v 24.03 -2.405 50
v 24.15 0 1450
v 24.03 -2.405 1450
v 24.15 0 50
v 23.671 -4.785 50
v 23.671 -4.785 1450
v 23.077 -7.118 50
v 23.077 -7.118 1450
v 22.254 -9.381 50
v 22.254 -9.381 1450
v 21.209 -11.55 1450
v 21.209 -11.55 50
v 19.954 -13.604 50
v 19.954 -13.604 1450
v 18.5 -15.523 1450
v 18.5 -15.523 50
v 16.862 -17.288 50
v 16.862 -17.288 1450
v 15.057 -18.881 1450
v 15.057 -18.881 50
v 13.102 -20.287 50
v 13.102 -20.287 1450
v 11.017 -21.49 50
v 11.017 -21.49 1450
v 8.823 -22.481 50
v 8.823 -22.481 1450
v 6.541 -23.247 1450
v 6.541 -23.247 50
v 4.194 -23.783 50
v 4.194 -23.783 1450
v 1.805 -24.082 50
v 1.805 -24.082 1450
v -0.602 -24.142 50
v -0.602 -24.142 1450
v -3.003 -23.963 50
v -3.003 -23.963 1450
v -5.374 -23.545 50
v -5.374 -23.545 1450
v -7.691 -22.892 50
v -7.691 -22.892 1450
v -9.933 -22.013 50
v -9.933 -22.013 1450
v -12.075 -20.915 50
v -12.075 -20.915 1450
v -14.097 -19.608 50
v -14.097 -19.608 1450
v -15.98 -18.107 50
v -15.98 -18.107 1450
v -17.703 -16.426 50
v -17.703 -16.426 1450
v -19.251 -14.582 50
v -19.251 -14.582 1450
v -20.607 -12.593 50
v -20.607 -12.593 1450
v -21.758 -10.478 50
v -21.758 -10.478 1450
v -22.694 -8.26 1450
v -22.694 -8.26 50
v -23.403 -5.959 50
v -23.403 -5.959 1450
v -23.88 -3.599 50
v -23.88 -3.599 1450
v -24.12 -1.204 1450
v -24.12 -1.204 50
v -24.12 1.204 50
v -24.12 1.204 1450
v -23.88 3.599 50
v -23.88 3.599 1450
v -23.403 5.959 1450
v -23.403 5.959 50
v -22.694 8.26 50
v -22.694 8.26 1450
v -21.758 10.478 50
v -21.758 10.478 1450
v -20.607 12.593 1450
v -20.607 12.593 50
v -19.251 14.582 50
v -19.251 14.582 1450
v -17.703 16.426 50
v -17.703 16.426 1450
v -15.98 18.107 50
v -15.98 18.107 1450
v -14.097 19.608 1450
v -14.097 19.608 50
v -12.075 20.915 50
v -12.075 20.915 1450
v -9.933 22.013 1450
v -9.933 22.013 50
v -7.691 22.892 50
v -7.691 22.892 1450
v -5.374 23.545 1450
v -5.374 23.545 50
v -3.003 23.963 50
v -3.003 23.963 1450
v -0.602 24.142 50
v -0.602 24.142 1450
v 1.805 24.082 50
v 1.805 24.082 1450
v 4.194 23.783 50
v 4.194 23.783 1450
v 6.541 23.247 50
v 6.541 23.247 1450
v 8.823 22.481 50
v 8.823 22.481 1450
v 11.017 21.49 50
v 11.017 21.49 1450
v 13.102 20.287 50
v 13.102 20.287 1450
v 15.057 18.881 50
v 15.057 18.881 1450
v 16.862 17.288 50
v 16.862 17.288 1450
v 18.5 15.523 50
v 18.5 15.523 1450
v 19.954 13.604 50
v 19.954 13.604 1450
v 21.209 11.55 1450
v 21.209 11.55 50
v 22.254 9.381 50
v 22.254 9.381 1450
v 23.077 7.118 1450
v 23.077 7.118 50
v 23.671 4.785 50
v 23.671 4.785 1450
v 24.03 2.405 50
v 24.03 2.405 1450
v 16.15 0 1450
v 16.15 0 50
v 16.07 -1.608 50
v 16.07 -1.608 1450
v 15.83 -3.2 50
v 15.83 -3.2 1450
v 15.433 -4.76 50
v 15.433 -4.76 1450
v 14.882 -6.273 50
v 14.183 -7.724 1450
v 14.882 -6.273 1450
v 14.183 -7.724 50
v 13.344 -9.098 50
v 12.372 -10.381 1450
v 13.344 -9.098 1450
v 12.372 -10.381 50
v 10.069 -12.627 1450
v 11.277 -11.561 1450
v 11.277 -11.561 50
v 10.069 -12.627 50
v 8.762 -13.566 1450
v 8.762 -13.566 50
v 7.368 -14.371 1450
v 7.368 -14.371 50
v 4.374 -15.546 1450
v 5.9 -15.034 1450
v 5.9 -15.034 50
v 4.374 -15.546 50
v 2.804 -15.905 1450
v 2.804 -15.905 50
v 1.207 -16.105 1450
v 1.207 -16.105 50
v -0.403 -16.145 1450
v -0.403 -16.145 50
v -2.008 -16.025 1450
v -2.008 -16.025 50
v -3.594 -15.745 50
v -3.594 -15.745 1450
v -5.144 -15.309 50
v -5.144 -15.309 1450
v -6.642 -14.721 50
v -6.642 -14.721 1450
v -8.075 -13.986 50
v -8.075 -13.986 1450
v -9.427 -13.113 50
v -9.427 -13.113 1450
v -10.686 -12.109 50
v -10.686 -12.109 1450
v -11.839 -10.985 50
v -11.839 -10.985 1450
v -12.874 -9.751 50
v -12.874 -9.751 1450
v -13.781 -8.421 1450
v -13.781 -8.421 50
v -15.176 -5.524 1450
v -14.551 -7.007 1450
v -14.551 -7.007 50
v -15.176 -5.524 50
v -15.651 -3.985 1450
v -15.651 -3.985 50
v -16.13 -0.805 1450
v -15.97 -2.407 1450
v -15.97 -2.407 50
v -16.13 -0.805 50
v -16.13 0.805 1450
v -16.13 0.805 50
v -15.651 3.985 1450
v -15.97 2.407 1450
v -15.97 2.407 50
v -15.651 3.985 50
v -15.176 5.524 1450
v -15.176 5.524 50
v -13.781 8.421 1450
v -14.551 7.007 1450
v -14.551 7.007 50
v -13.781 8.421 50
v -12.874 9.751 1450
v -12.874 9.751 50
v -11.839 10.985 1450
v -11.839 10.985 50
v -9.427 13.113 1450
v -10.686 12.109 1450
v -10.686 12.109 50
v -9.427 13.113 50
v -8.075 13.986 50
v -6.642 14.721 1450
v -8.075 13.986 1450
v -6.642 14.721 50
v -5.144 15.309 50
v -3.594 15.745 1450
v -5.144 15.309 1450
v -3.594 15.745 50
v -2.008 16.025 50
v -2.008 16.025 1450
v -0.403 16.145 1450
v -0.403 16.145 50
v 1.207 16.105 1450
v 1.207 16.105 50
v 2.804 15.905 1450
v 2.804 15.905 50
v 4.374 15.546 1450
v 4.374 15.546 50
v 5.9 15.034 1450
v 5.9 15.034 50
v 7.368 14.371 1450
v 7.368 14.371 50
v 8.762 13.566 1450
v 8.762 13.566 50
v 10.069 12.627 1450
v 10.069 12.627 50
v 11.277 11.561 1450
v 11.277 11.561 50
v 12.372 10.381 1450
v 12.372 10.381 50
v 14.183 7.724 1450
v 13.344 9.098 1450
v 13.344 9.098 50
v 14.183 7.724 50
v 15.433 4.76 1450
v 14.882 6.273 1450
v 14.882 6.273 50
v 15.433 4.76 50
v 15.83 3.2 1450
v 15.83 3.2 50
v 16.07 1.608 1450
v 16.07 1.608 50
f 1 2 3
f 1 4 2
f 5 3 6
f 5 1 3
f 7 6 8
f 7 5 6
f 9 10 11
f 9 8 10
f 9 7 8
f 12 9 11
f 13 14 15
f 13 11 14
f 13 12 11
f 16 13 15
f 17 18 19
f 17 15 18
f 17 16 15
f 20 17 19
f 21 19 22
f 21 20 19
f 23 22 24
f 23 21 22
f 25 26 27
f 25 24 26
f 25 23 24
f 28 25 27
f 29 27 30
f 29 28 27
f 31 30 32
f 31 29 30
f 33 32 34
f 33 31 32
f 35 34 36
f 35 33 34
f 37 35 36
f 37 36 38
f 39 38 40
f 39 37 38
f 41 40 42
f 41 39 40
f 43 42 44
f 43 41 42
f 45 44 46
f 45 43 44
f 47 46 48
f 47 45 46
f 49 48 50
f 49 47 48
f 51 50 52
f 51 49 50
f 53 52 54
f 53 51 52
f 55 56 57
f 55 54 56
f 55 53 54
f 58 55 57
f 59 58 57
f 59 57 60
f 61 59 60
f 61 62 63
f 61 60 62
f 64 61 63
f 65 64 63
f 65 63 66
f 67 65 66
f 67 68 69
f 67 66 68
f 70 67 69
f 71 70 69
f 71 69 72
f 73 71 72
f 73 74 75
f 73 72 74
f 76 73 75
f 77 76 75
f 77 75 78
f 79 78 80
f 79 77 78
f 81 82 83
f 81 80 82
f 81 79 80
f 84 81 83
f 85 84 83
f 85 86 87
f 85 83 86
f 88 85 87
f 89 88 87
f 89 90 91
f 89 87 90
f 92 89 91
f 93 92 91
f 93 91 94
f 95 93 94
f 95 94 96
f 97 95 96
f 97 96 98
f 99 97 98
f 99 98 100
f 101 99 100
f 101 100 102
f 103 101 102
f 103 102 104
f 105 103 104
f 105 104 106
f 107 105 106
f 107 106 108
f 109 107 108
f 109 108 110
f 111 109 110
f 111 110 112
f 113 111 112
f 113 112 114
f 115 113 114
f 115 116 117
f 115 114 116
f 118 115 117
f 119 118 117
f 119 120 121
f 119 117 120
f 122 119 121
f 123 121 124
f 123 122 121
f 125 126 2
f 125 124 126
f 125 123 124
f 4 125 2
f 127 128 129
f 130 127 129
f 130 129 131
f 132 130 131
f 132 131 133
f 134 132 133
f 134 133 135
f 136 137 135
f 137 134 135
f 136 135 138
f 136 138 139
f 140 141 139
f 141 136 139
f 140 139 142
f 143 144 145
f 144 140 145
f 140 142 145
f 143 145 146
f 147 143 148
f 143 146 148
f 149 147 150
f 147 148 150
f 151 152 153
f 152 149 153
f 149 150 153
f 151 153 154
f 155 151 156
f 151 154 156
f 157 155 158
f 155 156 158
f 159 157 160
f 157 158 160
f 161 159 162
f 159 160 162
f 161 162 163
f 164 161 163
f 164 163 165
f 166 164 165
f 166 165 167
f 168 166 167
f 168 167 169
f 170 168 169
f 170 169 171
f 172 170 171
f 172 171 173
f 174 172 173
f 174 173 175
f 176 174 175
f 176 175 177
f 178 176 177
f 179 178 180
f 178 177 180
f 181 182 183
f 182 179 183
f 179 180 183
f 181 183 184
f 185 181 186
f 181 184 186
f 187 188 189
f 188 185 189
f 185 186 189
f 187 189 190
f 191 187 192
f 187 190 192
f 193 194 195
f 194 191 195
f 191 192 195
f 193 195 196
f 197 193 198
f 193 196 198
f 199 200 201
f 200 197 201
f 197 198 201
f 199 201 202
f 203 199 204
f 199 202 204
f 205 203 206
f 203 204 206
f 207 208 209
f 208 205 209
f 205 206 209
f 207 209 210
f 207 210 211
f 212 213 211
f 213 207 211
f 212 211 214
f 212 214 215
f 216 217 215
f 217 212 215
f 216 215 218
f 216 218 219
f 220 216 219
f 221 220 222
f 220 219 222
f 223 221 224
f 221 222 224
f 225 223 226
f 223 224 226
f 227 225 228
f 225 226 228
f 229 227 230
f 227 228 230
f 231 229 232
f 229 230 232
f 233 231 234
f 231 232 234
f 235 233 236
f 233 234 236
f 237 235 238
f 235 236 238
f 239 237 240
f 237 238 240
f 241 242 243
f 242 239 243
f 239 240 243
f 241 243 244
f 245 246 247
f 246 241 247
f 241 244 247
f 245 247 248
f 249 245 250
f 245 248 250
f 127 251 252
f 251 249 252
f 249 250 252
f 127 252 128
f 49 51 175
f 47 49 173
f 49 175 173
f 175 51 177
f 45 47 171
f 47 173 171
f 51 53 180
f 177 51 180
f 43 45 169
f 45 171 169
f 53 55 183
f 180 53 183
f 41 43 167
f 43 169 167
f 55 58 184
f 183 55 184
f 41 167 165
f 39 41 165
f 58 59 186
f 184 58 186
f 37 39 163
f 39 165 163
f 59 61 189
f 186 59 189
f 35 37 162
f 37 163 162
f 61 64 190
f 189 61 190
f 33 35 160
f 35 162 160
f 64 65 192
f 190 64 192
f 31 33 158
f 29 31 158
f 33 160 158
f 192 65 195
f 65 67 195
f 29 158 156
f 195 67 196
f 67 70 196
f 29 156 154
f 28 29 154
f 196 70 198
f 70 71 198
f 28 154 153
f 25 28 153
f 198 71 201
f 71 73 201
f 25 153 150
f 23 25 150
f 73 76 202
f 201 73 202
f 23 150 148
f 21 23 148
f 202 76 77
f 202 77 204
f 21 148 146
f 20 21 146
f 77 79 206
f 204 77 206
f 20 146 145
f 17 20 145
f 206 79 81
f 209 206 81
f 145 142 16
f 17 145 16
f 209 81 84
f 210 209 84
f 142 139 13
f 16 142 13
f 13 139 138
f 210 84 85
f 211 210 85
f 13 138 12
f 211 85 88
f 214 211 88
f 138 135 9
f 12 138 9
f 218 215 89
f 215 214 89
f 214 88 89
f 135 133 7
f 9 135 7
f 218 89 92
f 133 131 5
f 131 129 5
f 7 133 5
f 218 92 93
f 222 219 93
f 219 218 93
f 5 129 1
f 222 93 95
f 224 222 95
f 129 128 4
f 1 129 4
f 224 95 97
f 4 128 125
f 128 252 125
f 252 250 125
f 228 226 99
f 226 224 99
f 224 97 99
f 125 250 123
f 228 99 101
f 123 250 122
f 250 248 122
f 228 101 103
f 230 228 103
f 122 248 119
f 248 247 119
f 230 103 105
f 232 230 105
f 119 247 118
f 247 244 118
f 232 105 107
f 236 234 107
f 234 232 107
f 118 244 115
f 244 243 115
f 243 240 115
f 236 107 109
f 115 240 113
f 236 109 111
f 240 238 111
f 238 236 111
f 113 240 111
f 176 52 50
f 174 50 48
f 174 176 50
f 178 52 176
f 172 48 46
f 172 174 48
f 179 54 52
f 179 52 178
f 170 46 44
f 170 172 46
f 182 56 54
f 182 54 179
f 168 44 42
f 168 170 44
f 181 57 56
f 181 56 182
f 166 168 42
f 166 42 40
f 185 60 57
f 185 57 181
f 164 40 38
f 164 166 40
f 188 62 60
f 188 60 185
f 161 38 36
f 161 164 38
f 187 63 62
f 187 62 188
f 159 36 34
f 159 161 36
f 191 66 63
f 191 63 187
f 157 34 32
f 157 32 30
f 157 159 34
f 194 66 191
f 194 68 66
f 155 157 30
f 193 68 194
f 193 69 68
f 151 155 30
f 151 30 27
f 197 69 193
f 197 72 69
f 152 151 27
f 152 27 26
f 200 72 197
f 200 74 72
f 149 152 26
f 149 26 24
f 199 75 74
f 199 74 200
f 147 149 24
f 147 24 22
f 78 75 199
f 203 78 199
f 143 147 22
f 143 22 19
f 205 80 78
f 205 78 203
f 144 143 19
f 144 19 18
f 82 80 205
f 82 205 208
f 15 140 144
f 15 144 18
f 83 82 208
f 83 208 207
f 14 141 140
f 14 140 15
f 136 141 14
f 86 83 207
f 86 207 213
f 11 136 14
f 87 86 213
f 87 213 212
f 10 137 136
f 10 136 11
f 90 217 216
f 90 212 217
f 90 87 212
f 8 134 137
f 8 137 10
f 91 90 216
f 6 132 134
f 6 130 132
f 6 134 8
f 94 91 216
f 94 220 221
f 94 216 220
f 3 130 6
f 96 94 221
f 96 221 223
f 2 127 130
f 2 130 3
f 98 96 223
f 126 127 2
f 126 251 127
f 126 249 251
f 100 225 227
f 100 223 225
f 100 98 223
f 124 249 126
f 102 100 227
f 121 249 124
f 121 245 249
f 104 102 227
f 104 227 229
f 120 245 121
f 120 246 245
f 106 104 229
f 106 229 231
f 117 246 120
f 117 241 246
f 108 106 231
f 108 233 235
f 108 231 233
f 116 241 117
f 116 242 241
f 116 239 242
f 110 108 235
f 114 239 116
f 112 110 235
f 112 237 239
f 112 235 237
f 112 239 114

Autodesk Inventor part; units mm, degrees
ref_plane "Начальная плоскость" through (0, 0, 50) normal (0, 0, 1) x (1, 0, 0)
ref_plane "Конечная плоскость" through (0, 0, 1450) normal (0, 0, 1) x (1, 0, 0)
sketch "Эскиз" plane through (0, 0, 0) normal (0, 0, 1) x (1, 0, 0)
  circle A0 centre (0, 0) radius 16.15
  circle A1 centre (0, 0) radius 24.15
  dimension "d0" = 48.3
  dimension "d1" = 8
extrude "Тело" add sketch "Эскиз" along normal up to surface (1400 mm away) from surface at 50
sketch "Sketch3" plane through (0, 0, 0) normal (0, 0, 1) x (1, 0, 0)
  line L0 (0, 0) -> (10, 0)
ref_plane "Work Plane3" through (0, 0, 0) normal (0, -1, 0) x (1, 0, 0)
sketch "Sketch4" plane through (0, 0, 0) normal (0, -1, 0) x (1, 0, 0)
  line L0 (-2, 50) -> (12, 50)
  line L1 (-2, 1450) -> (12, 1450)
  dimension "d7" = 1400
ref_plane "РабПлоскость4" through (25, -1000, 50) normal (0, 0, -1) x (-1, 0, 0)
split "Разделение1" plane through (25, -1000, 50) removes the side toward (0, 0, -1)
ref_plane "РабПлоскость5" through (-25, -1000, 1450) normal (0, 0, 1) x (1, 0, 0)
split "Разделение2" plane through (-25, -1000, 1450) removes the side toward (0, 0, 1)
equation "\"d0\" = G_H"
equation "\"d1\" = G_T"
equation "\"d2\" = G_L"
equation "\"G_H\" = 48.3"
equation "\"G_T\" = 8"
equation "\"G_L\" = d7"
properties part number "DIN2448 - 48,3 x 8 - 1400" material "Сталь, мягкая"
